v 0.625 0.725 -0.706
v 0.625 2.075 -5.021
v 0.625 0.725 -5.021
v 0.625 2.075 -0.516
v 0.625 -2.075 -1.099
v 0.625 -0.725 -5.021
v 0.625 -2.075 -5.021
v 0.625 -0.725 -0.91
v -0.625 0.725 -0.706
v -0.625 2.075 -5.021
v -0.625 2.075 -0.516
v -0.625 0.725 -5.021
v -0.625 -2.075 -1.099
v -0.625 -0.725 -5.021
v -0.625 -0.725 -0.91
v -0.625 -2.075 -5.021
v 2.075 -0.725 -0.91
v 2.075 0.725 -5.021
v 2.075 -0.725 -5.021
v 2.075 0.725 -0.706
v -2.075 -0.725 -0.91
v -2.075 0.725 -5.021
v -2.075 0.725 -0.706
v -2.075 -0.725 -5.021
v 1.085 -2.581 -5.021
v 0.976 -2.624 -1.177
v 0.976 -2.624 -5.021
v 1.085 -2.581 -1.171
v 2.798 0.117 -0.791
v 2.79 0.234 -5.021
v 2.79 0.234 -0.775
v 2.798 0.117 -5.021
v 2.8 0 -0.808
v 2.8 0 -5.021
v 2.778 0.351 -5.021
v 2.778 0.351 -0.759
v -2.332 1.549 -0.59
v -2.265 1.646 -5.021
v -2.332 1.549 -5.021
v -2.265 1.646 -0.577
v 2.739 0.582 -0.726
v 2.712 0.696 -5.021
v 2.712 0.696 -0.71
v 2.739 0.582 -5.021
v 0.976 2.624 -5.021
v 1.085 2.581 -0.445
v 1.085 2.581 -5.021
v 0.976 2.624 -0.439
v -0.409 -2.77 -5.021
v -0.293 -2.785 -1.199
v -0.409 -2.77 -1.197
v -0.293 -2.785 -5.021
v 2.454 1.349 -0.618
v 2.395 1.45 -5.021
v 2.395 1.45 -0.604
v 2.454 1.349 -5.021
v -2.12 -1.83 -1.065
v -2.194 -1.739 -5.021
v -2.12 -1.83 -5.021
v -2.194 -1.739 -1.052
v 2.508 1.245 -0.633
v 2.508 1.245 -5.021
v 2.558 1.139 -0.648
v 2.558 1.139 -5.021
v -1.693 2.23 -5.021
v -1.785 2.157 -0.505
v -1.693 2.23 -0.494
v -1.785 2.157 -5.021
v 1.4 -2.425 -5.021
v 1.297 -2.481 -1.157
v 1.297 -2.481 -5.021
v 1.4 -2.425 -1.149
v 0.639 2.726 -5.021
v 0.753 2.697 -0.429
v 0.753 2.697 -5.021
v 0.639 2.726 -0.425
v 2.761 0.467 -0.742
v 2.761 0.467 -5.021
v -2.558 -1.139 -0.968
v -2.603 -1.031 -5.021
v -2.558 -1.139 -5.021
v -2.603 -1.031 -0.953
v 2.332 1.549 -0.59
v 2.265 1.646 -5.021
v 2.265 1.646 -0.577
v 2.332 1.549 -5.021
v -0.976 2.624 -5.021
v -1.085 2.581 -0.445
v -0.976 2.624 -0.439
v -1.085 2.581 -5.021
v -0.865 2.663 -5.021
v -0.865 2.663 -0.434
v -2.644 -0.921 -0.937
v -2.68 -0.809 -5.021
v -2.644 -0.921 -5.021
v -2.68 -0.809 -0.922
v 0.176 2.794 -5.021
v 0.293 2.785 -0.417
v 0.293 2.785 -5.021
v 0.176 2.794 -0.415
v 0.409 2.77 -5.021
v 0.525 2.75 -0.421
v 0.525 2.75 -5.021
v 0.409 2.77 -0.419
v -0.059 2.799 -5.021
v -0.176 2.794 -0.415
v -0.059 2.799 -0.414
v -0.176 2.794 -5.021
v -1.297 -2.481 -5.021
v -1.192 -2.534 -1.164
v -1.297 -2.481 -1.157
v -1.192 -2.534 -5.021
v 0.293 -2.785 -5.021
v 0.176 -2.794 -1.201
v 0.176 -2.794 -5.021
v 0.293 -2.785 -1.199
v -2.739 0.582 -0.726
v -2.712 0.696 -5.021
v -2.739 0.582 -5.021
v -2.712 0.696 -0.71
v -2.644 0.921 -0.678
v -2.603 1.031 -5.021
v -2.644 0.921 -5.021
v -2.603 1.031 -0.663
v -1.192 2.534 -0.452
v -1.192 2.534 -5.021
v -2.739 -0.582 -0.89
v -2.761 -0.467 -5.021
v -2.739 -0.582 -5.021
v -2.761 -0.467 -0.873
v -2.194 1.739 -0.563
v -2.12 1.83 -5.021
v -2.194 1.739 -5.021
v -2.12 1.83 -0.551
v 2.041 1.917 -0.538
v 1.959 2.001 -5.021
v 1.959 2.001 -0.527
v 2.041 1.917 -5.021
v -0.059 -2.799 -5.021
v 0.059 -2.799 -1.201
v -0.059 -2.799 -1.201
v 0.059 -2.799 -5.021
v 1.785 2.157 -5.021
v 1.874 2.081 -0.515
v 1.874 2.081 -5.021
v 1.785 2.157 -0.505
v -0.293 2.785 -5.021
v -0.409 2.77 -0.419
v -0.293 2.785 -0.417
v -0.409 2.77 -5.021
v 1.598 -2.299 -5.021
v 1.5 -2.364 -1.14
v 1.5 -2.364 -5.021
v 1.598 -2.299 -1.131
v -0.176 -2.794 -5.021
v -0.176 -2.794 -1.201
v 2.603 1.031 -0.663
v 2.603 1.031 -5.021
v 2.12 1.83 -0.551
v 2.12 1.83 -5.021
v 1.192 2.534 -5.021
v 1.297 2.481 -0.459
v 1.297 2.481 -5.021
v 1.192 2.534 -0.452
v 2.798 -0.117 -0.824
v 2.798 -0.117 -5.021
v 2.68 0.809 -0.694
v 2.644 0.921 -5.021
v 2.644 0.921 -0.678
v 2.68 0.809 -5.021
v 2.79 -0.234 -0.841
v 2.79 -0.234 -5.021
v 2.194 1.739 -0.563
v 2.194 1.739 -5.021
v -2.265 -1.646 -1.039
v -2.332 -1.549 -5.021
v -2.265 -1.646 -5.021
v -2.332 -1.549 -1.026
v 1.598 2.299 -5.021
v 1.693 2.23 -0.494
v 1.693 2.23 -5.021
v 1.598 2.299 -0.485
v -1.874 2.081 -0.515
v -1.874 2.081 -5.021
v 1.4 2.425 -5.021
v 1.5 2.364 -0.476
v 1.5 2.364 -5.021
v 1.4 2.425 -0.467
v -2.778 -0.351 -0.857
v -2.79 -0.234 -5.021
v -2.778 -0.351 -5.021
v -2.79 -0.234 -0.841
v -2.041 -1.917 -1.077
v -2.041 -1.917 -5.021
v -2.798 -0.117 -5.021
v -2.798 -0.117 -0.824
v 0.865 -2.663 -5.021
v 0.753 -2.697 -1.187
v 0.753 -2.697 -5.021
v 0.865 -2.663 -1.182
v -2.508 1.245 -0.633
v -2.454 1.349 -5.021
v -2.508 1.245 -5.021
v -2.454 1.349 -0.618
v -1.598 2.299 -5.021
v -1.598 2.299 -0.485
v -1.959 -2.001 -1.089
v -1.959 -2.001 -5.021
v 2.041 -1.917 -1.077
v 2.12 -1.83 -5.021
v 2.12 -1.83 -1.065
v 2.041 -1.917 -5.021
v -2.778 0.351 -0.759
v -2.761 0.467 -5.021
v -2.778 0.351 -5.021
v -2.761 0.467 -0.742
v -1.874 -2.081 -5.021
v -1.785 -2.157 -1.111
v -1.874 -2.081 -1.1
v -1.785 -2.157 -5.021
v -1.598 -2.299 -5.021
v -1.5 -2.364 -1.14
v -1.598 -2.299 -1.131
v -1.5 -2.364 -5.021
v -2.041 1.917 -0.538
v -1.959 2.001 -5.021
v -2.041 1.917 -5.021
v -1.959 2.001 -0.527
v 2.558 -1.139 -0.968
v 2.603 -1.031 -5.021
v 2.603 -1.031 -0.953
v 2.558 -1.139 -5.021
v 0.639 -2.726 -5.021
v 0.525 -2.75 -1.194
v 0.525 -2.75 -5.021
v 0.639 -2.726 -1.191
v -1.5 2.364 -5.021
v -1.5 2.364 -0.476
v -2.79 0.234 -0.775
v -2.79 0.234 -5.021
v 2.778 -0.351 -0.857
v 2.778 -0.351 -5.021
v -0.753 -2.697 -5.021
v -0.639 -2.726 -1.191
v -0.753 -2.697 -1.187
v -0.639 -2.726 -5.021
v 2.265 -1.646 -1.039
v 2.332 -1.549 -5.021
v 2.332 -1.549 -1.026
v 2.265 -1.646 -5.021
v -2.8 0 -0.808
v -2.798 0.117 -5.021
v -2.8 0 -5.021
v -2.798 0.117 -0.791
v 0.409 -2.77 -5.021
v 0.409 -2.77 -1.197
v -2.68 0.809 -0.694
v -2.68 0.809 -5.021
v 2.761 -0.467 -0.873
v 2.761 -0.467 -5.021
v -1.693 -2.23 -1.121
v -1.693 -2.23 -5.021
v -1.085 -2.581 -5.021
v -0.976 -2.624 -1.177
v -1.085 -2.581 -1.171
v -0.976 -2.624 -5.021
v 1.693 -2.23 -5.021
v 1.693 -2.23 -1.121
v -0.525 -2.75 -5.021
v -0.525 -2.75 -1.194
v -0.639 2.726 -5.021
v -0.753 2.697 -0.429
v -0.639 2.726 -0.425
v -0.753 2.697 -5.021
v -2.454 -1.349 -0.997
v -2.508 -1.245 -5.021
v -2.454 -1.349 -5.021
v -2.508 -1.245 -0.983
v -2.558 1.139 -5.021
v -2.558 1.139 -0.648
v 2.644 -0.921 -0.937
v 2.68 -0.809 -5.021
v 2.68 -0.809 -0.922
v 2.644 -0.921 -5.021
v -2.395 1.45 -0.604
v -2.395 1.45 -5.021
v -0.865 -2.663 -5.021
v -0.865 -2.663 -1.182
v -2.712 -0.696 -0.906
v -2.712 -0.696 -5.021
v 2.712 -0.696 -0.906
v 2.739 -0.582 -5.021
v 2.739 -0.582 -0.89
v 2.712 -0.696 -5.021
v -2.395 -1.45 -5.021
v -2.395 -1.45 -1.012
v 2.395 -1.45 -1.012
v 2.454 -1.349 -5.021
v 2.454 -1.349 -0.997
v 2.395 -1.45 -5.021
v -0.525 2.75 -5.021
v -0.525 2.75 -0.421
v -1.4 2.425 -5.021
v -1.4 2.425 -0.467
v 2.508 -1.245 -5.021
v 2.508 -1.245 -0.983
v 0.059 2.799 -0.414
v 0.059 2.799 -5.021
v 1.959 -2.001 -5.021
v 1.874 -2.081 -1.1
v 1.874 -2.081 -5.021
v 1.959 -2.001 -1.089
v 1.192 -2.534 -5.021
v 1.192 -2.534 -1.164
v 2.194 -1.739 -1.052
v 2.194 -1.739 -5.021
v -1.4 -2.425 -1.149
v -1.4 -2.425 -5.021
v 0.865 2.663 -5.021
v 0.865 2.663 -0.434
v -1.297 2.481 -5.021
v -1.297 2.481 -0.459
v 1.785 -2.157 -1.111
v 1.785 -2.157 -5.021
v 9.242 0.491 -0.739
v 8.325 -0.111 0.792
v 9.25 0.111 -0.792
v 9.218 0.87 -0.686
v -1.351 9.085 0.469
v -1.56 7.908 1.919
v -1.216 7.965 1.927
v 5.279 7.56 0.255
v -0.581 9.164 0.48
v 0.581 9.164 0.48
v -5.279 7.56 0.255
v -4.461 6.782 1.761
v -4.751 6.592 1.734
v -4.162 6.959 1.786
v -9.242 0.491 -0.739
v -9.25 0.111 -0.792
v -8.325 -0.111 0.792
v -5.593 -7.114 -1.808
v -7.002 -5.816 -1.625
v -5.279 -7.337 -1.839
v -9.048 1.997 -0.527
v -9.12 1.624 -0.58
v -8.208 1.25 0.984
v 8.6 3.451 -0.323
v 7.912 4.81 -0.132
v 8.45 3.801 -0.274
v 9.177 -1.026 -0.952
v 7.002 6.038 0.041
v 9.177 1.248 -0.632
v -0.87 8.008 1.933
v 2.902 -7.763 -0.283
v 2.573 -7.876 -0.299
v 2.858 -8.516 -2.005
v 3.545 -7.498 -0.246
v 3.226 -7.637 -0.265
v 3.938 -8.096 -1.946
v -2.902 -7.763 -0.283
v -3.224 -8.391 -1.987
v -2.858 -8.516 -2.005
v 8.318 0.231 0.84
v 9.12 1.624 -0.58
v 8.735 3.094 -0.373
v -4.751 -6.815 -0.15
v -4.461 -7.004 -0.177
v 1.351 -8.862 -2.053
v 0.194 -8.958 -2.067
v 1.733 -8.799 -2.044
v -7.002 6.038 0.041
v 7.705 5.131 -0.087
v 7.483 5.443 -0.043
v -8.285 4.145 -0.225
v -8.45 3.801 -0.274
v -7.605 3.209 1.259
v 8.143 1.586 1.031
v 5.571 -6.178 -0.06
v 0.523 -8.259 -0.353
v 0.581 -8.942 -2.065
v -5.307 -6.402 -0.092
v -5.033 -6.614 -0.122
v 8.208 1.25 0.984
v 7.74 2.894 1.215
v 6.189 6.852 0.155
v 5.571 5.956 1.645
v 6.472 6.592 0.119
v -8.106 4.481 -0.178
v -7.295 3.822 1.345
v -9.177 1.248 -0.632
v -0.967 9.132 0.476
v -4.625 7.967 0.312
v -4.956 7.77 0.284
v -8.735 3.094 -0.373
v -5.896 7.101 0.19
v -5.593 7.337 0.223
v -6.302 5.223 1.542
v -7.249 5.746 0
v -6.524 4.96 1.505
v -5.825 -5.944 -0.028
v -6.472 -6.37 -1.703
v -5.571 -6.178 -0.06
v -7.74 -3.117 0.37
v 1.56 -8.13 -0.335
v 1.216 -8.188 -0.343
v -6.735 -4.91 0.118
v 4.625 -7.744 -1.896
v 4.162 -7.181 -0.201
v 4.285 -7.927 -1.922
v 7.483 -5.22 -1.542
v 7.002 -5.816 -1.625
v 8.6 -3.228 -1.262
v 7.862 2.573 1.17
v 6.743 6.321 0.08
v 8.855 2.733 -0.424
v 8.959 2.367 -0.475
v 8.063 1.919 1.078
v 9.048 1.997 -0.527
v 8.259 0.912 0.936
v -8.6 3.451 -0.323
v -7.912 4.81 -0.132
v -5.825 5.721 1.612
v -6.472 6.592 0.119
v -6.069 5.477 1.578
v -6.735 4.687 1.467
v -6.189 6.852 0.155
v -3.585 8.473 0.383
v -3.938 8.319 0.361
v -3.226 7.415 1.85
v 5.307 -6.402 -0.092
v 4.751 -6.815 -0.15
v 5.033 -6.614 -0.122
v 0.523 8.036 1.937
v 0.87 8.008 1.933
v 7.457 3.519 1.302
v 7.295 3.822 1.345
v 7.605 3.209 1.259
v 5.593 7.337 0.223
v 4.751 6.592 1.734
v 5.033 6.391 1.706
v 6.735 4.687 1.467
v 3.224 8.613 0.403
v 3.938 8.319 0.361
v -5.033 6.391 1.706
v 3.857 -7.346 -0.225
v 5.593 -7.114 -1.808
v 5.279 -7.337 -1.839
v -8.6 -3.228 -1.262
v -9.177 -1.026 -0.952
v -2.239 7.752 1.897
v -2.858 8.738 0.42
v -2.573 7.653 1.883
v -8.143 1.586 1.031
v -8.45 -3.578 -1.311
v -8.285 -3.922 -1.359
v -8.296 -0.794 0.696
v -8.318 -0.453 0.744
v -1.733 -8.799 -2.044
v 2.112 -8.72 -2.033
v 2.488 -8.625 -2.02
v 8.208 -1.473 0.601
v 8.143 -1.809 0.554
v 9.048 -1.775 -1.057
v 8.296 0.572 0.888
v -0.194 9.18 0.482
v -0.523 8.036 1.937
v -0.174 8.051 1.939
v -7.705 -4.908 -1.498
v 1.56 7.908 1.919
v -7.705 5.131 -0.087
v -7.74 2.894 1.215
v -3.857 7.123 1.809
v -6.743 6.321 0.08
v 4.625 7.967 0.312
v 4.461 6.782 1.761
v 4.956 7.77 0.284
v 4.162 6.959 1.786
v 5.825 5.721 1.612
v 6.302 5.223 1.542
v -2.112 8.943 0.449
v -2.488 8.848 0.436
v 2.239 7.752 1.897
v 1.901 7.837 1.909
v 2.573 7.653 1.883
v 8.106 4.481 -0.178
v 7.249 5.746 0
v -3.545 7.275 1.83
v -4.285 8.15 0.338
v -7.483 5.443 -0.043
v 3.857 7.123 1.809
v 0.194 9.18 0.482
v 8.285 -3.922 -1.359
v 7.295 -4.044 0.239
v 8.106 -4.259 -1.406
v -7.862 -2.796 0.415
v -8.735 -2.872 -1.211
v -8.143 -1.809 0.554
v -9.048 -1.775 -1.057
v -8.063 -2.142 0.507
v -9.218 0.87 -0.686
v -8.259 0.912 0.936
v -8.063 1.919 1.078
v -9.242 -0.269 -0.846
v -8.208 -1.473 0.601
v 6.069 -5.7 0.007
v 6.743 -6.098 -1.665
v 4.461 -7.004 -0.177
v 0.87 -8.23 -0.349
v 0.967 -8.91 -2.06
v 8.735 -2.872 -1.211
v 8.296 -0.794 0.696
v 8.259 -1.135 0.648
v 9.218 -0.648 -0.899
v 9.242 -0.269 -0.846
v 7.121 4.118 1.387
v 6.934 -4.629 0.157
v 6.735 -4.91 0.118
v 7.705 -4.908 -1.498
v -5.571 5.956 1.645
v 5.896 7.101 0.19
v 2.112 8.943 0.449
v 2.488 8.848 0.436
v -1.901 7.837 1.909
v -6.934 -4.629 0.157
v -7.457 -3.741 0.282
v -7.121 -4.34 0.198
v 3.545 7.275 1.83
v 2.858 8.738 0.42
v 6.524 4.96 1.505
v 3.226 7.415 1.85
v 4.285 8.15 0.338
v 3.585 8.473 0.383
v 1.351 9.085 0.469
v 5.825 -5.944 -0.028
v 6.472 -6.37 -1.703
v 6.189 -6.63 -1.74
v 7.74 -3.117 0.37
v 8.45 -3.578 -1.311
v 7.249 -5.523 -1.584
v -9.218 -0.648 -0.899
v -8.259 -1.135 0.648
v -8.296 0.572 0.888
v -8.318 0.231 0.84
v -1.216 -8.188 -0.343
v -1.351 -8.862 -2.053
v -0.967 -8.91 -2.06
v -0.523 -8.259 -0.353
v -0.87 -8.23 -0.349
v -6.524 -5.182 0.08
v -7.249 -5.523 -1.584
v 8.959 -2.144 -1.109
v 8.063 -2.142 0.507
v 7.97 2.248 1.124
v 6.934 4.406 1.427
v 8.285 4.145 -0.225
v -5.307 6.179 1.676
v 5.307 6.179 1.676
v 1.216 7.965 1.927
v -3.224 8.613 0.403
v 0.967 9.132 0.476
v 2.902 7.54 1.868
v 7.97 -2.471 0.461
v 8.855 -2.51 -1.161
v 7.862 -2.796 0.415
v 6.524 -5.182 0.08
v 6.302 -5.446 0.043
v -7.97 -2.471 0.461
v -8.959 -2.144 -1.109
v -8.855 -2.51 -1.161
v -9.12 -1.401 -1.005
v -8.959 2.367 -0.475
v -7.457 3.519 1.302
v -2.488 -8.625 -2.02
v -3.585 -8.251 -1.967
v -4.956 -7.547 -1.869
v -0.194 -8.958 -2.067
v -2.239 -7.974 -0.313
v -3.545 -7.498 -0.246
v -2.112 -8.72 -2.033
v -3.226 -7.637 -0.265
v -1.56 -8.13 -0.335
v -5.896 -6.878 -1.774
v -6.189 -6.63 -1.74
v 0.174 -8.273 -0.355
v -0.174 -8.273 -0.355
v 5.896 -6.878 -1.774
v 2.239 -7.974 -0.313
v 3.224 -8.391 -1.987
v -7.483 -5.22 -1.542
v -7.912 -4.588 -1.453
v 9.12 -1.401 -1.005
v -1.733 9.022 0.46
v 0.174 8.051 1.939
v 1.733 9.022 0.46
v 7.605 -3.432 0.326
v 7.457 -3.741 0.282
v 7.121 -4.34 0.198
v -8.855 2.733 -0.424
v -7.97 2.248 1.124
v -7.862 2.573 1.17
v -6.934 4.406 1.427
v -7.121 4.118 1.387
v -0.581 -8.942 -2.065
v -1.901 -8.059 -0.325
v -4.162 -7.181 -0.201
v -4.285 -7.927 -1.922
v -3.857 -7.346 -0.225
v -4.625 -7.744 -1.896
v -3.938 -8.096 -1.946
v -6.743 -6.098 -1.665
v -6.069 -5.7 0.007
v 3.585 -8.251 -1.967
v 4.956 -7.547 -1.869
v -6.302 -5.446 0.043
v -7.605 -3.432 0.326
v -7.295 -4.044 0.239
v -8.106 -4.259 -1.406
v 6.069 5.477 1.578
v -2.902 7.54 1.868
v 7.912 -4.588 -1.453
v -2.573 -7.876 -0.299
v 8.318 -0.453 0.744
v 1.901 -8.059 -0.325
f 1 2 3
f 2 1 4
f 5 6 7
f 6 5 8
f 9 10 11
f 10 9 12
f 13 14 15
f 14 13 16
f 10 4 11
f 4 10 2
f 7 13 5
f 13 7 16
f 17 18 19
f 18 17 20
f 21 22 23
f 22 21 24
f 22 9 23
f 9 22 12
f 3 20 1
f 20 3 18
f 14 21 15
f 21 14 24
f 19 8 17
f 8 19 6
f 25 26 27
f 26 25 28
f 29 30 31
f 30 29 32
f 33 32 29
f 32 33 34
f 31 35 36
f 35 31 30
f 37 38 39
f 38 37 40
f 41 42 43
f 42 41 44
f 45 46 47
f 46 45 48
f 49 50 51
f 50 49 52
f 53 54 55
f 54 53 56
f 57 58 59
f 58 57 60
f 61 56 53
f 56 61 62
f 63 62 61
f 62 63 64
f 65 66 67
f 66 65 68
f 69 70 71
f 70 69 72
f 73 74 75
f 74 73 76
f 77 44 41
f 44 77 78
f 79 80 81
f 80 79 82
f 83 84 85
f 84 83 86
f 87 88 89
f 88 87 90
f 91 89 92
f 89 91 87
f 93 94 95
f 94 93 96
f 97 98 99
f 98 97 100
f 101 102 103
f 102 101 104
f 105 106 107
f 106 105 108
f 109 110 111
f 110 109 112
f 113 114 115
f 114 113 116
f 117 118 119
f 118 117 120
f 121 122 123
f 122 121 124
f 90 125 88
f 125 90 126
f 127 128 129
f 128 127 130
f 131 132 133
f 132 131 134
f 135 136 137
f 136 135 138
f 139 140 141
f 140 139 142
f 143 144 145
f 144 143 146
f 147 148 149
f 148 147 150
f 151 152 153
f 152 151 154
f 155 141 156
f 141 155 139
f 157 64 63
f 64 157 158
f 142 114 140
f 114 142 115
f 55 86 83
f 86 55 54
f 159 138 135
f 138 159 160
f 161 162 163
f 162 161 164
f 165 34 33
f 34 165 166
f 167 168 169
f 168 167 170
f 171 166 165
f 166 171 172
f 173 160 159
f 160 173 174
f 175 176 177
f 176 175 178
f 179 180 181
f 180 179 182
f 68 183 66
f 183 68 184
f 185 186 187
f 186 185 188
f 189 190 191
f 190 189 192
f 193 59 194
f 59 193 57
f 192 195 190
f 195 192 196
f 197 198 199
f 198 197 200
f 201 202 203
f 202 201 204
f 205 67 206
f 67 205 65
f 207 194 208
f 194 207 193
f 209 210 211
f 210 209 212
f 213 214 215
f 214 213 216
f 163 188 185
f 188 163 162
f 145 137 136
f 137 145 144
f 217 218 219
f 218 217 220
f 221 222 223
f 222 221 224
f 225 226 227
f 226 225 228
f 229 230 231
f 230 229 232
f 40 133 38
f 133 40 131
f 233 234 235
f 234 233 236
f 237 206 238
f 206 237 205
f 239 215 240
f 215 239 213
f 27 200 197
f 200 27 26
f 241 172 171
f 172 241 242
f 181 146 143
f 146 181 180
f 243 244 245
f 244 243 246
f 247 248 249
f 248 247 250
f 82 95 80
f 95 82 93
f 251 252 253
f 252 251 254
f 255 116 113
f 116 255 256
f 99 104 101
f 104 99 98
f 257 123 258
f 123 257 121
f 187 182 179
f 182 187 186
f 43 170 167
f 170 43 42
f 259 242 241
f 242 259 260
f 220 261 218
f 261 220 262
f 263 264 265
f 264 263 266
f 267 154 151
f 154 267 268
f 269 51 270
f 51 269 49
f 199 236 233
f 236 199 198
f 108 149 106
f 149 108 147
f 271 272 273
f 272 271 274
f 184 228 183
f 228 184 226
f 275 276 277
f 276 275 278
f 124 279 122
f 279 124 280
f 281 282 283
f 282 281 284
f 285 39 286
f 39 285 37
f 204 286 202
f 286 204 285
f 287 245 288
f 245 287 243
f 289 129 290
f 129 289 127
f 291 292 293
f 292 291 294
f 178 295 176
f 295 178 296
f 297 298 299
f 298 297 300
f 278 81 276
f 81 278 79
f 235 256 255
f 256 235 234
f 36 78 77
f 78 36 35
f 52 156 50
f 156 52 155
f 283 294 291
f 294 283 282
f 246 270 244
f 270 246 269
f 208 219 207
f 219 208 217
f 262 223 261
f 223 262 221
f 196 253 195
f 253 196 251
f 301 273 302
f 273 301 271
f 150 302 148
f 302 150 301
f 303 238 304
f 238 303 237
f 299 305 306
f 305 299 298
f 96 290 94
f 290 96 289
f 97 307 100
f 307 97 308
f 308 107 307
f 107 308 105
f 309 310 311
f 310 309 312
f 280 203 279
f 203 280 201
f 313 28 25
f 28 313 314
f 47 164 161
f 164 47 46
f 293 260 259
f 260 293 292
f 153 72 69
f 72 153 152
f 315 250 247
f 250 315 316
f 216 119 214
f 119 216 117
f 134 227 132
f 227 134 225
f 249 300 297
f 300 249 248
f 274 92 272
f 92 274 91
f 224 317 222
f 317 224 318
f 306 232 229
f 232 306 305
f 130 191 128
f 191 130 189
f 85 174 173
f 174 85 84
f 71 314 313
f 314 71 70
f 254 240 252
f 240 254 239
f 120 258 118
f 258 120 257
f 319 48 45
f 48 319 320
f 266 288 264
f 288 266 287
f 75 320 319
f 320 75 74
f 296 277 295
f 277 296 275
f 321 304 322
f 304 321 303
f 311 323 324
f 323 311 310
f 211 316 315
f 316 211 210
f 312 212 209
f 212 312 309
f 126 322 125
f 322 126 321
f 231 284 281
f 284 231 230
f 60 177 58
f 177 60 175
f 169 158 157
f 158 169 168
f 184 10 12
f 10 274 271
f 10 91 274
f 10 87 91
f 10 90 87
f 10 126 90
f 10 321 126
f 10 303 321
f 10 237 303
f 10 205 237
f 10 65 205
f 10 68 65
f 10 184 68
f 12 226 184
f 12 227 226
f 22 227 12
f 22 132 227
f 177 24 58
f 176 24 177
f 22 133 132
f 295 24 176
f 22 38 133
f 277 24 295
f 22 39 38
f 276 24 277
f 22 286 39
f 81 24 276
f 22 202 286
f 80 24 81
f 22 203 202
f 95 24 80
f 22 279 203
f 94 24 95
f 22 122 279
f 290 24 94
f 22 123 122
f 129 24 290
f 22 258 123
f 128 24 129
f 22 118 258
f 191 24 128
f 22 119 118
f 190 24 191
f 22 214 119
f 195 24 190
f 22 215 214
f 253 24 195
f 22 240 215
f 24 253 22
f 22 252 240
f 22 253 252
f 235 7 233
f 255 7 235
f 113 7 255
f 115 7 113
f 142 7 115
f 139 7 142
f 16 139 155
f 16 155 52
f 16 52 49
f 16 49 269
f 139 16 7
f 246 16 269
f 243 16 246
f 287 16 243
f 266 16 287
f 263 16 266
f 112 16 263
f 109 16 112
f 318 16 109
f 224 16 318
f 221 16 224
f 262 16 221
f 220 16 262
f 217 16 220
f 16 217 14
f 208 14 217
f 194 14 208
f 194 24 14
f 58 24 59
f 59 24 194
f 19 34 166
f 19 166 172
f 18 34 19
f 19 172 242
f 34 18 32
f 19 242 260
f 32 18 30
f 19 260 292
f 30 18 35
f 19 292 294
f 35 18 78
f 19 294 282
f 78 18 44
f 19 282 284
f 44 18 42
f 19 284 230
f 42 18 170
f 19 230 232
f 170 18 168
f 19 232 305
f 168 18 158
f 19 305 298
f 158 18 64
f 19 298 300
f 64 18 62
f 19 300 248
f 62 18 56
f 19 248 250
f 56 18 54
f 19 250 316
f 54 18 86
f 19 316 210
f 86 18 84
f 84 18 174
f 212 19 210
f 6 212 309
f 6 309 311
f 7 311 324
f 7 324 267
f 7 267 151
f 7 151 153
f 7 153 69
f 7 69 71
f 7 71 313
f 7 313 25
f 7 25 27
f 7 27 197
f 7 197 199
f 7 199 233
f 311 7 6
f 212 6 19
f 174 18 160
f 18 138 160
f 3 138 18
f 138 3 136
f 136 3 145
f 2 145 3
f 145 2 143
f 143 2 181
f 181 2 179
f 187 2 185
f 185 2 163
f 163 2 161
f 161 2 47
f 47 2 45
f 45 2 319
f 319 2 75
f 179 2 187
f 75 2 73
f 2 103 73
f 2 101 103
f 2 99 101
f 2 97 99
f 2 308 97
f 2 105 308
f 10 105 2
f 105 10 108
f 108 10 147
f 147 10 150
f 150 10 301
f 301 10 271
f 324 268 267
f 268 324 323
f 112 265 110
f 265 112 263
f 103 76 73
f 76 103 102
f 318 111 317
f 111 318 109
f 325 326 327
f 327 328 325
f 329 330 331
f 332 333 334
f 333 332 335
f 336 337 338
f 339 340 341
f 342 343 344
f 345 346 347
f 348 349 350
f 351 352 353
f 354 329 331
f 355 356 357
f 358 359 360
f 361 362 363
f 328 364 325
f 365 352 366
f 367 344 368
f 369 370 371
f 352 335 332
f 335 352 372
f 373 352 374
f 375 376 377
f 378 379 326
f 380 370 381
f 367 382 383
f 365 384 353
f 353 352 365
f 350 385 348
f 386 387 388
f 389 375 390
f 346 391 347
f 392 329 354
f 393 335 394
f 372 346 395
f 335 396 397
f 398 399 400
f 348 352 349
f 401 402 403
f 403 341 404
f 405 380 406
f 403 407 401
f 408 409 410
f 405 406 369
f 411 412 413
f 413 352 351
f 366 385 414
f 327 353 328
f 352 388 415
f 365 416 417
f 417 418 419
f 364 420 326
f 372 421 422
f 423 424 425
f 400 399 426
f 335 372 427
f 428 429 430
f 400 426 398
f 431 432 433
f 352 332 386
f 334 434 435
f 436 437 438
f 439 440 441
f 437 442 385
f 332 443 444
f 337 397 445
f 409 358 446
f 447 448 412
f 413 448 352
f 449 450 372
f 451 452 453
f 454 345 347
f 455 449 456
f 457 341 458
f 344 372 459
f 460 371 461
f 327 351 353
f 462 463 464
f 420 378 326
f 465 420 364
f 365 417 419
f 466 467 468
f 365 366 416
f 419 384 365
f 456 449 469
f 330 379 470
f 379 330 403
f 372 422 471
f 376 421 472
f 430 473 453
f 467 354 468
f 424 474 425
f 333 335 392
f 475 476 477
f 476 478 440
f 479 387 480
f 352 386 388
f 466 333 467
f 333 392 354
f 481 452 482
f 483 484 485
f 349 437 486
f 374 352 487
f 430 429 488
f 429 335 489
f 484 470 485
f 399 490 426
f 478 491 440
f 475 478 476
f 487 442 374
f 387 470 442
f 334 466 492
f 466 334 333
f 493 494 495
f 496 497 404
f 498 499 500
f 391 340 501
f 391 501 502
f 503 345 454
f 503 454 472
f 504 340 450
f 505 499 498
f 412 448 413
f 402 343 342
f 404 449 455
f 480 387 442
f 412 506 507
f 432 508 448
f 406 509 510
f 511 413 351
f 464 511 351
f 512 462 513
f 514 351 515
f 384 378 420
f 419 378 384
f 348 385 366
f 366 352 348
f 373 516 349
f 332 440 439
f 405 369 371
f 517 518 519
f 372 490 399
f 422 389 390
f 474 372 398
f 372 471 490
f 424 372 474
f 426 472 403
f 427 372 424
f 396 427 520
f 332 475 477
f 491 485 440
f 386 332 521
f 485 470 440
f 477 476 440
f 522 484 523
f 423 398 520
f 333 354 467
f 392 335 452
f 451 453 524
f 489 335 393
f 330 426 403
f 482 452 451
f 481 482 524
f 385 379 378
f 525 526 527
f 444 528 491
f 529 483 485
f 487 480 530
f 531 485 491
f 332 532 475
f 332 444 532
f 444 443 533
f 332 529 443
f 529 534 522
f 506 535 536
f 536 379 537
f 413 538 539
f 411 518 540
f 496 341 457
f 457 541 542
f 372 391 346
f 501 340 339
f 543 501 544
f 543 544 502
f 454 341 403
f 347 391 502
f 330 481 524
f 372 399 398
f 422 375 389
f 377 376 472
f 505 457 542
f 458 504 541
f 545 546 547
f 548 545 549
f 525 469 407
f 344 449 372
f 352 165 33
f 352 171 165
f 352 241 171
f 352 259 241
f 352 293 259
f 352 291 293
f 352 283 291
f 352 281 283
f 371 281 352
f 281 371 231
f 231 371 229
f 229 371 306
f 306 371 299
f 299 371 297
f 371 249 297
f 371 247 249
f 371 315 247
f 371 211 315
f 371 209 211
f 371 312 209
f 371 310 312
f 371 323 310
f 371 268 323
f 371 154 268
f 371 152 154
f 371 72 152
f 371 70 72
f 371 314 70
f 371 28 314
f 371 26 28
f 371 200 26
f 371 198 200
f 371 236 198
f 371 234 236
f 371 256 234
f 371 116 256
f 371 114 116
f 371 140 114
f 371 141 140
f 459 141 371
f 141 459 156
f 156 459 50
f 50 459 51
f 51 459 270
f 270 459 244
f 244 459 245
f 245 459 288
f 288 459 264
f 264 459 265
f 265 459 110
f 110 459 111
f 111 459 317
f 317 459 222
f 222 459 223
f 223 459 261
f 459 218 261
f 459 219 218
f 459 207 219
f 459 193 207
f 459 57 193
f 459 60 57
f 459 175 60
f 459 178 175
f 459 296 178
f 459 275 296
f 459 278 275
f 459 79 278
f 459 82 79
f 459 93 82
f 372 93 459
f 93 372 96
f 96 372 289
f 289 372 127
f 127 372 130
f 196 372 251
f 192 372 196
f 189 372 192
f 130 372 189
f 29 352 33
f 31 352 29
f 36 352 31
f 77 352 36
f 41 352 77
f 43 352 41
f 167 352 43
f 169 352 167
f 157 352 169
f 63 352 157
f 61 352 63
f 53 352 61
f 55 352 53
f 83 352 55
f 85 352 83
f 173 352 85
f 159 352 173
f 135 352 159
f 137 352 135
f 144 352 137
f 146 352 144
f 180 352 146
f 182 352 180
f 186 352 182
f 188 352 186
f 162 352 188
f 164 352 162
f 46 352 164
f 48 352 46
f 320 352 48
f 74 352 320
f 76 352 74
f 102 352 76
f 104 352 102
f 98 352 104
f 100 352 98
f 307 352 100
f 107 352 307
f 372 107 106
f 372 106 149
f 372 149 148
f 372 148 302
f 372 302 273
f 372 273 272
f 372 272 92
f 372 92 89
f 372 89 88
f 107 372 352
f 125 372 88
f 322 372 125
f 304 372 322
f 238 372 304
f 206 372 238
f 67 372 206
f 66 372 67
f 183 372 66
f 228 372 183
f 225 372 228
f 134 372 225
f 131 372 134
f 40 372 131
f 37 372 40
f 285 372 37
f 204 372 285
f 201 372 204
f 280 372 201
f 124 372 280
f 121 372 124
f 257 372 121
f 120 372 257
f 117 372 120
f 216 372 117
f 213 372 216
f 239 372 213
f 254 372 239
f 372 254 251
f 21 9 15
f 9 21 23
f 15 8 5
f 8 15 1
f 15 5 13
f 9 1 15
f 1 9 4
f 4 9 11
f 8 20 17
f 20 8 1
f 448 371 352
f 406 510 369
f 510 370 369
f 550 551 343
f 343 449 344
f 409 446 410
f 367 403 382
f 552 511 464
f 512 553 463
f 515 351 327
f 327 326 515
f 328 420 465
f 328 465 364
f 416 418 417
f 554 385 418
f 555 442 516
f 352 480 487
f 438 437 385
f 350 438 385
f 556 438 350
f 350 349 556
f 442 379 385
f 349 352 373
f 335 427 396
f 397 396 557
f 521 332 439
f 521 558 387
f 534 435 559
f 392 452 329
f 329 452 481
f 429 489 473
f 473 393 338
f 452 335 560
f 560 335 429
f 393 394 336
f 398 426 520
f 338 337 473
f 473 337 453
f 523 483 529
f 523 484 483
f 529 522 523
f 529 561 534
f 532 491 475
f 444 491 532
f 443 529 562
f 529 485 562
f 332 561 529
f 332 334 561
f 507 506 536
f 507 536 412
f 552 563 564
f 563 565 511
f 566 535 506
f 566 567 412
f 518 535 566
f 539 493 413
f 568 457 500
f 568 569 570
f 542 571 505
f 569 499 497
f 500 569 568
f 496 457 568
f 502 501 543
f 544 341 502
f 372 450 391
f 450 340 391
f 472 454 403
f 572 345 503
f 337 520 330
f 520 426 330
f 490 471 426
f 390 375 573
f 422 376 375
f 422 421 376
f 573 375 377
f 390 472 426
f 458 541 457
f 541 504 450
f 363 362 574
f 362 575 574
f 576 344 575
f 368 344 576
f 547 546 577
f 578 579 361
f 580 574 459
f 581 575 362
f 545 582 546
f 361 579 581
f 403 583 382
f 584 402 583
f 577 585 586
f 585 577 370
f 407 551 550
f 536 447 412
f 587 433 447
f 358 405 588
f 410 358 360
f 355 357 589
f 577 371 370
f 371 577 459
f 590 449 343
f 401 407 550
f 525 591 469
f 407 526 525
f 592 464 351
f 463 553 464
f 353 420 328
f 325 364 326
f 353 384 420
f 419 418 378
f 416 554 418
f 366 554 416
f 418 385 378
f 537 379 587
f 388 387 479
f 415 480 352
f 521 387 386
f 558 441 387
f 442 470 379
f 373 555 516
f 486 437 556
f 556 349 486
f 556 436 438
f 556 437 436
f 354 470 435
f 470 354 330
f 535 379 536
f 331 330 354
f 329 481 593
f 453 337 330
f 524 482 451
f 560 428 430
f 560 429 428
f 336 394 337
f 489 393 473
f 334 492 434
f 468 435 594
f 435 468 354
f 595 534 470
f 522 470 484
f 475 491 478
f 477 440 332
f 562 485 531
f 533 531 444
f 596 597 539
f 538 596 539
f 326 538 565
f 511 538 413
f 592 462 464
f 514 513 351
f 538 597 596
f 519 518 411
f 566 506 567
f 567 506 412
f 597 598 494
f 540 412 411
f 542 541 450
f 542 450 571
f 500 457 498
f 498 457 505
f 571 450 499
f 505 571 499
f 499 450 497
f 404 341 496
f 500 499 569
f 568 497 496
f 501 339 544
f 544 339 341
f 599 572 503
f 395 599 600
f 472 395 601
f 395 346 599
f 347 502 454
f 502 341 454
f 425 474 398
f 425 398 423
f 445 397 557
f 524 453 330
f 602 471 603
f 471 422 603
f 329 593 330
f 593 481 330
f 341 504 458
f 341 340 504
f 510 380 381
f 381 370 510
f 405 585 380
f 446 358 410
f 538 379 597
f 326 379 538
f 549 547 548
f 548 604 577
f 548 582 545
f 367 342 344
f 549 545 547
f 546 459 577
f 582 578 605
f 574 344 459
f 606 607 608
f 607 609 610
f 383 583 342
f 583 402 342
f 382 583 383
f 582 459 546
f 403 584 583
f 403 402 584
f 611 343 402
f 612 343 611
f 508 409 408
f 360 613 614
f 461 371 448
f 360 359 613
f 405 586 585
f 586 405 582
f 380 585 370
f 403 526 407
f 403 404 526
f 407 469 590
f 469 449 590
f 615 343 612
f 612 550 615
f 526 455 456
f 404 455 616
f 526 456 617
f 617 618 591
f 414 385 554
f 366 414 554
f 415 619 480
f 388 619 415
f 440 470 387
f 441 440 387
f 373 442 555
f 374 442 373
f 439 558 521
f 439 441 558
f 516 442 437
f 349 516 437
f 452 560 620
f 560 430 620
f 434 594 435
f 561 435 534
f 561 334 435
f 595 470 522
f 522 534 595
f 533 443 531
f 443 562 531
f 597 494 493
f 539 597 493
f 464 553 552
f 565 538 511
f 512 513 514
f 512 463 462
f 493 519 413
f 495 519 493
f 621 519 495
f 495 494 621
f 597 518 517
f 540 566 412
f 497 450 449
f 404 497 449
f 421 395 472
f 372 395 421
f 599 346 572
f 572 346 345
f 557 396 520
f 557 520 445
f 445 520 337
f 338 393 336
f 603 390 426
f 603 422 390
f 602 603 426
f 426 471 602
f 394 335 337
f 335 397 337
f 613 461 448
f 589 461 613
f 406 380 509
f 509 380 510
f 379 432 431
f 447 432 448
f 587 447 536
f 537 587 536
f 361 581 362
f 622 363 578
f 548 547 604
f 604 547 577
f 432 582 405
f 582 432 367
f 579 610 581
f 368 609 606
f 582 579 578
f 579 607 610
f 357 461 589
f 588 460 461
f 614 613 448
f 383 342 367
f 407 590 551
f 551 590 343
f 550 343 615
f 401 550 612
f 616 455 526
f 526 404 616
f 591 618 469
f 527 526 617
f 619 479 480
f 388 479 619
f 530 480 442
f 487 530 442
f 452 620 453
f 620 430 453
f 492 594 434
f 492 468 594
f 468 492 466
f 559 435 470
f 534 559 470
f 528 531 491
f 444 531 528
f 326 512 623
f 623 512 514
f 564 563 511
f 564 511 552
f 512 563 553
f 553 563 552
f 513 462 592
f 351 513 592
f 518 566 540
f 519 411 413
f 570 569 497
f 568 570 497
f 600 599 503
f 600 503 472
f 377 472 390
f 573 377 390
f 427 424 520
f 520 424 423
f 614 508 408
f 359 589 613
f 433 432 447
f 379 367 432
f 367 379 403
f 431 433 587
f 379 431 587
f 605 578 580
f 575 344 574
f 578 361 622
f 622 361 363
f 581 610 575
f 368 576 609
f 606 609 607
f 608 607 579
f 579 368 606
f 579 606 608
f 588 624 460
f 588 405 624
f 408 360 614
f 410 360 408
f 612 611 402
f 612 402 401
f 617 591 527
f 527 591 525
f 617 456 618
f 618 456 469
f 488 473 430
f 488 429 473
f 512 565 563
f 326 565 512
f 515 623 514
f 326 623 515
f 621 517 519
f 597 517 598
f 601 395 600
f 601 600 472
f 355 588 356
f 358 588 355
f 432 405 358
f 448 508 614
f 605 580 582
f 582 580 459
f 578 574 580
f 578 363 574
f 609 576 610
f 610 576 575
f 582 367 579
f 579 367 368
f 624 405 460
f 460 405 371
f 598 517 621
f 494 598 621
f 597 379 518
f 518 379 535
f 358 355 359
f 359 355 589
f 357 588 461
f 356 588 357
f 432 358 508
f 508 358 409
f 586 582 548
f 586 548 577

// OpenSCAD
// This creates angled keycaps that can be used on a board whose PCB has been angled so that the back rows are higher than the front rows. The keycap angle counteracts the PCB angle, so that the keycap surfaces are flat similar to the table the instrument sits on. In a separate OpenSCAD file I experimented with keycaps of various heights (for use on a flat PCB), but found stem wobble made the taller keycaps feel annoying.
$fn = 150;

slantDegrees = 8;

lPad = 19;
wPad = 16 * cos(slantDegrees);
hPad = 1.6;
cut = 2.5;

rStem = 2.9;
hStem = 3.8 + 2 * tan(slantDegrees) * rStem;


module CapRound() {
    rotate(a=slantDegrees, v=[1, 0, 0]) translate([0, 0, 0*hPad/2]) scale([18.5/2, 18.5*cos(slantDegrees)/2, hPad]) cylinder(h=1, r1=1, r2=0.9, center=true);
}

module CapRectangular() {
    rotate(a=slantDegrees, v=[1, 0, 0]) translate([0, 0, -hPad/2]) linear_extrude(height = hPad, scale = 0.88) polygon(points=[
            [-lPad/2, -wPad/2 + cut],
            [-lPad/2, wPad/2 - cut],
            [-lPad/2 + cut, wPad/2],
            [lPad/2 - cut, wPad/2],
            [lPad/2, wPad/2 - cut],
            [lPad/2, -wPad/2 + cut],
            [lPad/2 - cut, -wPad/2],
            [-lPad/2 + cut, -wPad/2],
        ]);
}

module Stem() {
    translate([0, 0, -hStem - tan(slantDegrees) * rStem + 0.002]) difference() {
        translate([0, 0, (hStem)/2]) cylinder(h=hStem, r1=2.8, r2=2.8, center=true);
        translate([0, 0, hStem/2 - 0.001]) union() {
            cube([1.25, 4.15, hStem], center=true);
            cube([4.15, 1.45, hStem], center=true);
        }
    }
}

CapRound();
//CapRectangular();
Stem();
